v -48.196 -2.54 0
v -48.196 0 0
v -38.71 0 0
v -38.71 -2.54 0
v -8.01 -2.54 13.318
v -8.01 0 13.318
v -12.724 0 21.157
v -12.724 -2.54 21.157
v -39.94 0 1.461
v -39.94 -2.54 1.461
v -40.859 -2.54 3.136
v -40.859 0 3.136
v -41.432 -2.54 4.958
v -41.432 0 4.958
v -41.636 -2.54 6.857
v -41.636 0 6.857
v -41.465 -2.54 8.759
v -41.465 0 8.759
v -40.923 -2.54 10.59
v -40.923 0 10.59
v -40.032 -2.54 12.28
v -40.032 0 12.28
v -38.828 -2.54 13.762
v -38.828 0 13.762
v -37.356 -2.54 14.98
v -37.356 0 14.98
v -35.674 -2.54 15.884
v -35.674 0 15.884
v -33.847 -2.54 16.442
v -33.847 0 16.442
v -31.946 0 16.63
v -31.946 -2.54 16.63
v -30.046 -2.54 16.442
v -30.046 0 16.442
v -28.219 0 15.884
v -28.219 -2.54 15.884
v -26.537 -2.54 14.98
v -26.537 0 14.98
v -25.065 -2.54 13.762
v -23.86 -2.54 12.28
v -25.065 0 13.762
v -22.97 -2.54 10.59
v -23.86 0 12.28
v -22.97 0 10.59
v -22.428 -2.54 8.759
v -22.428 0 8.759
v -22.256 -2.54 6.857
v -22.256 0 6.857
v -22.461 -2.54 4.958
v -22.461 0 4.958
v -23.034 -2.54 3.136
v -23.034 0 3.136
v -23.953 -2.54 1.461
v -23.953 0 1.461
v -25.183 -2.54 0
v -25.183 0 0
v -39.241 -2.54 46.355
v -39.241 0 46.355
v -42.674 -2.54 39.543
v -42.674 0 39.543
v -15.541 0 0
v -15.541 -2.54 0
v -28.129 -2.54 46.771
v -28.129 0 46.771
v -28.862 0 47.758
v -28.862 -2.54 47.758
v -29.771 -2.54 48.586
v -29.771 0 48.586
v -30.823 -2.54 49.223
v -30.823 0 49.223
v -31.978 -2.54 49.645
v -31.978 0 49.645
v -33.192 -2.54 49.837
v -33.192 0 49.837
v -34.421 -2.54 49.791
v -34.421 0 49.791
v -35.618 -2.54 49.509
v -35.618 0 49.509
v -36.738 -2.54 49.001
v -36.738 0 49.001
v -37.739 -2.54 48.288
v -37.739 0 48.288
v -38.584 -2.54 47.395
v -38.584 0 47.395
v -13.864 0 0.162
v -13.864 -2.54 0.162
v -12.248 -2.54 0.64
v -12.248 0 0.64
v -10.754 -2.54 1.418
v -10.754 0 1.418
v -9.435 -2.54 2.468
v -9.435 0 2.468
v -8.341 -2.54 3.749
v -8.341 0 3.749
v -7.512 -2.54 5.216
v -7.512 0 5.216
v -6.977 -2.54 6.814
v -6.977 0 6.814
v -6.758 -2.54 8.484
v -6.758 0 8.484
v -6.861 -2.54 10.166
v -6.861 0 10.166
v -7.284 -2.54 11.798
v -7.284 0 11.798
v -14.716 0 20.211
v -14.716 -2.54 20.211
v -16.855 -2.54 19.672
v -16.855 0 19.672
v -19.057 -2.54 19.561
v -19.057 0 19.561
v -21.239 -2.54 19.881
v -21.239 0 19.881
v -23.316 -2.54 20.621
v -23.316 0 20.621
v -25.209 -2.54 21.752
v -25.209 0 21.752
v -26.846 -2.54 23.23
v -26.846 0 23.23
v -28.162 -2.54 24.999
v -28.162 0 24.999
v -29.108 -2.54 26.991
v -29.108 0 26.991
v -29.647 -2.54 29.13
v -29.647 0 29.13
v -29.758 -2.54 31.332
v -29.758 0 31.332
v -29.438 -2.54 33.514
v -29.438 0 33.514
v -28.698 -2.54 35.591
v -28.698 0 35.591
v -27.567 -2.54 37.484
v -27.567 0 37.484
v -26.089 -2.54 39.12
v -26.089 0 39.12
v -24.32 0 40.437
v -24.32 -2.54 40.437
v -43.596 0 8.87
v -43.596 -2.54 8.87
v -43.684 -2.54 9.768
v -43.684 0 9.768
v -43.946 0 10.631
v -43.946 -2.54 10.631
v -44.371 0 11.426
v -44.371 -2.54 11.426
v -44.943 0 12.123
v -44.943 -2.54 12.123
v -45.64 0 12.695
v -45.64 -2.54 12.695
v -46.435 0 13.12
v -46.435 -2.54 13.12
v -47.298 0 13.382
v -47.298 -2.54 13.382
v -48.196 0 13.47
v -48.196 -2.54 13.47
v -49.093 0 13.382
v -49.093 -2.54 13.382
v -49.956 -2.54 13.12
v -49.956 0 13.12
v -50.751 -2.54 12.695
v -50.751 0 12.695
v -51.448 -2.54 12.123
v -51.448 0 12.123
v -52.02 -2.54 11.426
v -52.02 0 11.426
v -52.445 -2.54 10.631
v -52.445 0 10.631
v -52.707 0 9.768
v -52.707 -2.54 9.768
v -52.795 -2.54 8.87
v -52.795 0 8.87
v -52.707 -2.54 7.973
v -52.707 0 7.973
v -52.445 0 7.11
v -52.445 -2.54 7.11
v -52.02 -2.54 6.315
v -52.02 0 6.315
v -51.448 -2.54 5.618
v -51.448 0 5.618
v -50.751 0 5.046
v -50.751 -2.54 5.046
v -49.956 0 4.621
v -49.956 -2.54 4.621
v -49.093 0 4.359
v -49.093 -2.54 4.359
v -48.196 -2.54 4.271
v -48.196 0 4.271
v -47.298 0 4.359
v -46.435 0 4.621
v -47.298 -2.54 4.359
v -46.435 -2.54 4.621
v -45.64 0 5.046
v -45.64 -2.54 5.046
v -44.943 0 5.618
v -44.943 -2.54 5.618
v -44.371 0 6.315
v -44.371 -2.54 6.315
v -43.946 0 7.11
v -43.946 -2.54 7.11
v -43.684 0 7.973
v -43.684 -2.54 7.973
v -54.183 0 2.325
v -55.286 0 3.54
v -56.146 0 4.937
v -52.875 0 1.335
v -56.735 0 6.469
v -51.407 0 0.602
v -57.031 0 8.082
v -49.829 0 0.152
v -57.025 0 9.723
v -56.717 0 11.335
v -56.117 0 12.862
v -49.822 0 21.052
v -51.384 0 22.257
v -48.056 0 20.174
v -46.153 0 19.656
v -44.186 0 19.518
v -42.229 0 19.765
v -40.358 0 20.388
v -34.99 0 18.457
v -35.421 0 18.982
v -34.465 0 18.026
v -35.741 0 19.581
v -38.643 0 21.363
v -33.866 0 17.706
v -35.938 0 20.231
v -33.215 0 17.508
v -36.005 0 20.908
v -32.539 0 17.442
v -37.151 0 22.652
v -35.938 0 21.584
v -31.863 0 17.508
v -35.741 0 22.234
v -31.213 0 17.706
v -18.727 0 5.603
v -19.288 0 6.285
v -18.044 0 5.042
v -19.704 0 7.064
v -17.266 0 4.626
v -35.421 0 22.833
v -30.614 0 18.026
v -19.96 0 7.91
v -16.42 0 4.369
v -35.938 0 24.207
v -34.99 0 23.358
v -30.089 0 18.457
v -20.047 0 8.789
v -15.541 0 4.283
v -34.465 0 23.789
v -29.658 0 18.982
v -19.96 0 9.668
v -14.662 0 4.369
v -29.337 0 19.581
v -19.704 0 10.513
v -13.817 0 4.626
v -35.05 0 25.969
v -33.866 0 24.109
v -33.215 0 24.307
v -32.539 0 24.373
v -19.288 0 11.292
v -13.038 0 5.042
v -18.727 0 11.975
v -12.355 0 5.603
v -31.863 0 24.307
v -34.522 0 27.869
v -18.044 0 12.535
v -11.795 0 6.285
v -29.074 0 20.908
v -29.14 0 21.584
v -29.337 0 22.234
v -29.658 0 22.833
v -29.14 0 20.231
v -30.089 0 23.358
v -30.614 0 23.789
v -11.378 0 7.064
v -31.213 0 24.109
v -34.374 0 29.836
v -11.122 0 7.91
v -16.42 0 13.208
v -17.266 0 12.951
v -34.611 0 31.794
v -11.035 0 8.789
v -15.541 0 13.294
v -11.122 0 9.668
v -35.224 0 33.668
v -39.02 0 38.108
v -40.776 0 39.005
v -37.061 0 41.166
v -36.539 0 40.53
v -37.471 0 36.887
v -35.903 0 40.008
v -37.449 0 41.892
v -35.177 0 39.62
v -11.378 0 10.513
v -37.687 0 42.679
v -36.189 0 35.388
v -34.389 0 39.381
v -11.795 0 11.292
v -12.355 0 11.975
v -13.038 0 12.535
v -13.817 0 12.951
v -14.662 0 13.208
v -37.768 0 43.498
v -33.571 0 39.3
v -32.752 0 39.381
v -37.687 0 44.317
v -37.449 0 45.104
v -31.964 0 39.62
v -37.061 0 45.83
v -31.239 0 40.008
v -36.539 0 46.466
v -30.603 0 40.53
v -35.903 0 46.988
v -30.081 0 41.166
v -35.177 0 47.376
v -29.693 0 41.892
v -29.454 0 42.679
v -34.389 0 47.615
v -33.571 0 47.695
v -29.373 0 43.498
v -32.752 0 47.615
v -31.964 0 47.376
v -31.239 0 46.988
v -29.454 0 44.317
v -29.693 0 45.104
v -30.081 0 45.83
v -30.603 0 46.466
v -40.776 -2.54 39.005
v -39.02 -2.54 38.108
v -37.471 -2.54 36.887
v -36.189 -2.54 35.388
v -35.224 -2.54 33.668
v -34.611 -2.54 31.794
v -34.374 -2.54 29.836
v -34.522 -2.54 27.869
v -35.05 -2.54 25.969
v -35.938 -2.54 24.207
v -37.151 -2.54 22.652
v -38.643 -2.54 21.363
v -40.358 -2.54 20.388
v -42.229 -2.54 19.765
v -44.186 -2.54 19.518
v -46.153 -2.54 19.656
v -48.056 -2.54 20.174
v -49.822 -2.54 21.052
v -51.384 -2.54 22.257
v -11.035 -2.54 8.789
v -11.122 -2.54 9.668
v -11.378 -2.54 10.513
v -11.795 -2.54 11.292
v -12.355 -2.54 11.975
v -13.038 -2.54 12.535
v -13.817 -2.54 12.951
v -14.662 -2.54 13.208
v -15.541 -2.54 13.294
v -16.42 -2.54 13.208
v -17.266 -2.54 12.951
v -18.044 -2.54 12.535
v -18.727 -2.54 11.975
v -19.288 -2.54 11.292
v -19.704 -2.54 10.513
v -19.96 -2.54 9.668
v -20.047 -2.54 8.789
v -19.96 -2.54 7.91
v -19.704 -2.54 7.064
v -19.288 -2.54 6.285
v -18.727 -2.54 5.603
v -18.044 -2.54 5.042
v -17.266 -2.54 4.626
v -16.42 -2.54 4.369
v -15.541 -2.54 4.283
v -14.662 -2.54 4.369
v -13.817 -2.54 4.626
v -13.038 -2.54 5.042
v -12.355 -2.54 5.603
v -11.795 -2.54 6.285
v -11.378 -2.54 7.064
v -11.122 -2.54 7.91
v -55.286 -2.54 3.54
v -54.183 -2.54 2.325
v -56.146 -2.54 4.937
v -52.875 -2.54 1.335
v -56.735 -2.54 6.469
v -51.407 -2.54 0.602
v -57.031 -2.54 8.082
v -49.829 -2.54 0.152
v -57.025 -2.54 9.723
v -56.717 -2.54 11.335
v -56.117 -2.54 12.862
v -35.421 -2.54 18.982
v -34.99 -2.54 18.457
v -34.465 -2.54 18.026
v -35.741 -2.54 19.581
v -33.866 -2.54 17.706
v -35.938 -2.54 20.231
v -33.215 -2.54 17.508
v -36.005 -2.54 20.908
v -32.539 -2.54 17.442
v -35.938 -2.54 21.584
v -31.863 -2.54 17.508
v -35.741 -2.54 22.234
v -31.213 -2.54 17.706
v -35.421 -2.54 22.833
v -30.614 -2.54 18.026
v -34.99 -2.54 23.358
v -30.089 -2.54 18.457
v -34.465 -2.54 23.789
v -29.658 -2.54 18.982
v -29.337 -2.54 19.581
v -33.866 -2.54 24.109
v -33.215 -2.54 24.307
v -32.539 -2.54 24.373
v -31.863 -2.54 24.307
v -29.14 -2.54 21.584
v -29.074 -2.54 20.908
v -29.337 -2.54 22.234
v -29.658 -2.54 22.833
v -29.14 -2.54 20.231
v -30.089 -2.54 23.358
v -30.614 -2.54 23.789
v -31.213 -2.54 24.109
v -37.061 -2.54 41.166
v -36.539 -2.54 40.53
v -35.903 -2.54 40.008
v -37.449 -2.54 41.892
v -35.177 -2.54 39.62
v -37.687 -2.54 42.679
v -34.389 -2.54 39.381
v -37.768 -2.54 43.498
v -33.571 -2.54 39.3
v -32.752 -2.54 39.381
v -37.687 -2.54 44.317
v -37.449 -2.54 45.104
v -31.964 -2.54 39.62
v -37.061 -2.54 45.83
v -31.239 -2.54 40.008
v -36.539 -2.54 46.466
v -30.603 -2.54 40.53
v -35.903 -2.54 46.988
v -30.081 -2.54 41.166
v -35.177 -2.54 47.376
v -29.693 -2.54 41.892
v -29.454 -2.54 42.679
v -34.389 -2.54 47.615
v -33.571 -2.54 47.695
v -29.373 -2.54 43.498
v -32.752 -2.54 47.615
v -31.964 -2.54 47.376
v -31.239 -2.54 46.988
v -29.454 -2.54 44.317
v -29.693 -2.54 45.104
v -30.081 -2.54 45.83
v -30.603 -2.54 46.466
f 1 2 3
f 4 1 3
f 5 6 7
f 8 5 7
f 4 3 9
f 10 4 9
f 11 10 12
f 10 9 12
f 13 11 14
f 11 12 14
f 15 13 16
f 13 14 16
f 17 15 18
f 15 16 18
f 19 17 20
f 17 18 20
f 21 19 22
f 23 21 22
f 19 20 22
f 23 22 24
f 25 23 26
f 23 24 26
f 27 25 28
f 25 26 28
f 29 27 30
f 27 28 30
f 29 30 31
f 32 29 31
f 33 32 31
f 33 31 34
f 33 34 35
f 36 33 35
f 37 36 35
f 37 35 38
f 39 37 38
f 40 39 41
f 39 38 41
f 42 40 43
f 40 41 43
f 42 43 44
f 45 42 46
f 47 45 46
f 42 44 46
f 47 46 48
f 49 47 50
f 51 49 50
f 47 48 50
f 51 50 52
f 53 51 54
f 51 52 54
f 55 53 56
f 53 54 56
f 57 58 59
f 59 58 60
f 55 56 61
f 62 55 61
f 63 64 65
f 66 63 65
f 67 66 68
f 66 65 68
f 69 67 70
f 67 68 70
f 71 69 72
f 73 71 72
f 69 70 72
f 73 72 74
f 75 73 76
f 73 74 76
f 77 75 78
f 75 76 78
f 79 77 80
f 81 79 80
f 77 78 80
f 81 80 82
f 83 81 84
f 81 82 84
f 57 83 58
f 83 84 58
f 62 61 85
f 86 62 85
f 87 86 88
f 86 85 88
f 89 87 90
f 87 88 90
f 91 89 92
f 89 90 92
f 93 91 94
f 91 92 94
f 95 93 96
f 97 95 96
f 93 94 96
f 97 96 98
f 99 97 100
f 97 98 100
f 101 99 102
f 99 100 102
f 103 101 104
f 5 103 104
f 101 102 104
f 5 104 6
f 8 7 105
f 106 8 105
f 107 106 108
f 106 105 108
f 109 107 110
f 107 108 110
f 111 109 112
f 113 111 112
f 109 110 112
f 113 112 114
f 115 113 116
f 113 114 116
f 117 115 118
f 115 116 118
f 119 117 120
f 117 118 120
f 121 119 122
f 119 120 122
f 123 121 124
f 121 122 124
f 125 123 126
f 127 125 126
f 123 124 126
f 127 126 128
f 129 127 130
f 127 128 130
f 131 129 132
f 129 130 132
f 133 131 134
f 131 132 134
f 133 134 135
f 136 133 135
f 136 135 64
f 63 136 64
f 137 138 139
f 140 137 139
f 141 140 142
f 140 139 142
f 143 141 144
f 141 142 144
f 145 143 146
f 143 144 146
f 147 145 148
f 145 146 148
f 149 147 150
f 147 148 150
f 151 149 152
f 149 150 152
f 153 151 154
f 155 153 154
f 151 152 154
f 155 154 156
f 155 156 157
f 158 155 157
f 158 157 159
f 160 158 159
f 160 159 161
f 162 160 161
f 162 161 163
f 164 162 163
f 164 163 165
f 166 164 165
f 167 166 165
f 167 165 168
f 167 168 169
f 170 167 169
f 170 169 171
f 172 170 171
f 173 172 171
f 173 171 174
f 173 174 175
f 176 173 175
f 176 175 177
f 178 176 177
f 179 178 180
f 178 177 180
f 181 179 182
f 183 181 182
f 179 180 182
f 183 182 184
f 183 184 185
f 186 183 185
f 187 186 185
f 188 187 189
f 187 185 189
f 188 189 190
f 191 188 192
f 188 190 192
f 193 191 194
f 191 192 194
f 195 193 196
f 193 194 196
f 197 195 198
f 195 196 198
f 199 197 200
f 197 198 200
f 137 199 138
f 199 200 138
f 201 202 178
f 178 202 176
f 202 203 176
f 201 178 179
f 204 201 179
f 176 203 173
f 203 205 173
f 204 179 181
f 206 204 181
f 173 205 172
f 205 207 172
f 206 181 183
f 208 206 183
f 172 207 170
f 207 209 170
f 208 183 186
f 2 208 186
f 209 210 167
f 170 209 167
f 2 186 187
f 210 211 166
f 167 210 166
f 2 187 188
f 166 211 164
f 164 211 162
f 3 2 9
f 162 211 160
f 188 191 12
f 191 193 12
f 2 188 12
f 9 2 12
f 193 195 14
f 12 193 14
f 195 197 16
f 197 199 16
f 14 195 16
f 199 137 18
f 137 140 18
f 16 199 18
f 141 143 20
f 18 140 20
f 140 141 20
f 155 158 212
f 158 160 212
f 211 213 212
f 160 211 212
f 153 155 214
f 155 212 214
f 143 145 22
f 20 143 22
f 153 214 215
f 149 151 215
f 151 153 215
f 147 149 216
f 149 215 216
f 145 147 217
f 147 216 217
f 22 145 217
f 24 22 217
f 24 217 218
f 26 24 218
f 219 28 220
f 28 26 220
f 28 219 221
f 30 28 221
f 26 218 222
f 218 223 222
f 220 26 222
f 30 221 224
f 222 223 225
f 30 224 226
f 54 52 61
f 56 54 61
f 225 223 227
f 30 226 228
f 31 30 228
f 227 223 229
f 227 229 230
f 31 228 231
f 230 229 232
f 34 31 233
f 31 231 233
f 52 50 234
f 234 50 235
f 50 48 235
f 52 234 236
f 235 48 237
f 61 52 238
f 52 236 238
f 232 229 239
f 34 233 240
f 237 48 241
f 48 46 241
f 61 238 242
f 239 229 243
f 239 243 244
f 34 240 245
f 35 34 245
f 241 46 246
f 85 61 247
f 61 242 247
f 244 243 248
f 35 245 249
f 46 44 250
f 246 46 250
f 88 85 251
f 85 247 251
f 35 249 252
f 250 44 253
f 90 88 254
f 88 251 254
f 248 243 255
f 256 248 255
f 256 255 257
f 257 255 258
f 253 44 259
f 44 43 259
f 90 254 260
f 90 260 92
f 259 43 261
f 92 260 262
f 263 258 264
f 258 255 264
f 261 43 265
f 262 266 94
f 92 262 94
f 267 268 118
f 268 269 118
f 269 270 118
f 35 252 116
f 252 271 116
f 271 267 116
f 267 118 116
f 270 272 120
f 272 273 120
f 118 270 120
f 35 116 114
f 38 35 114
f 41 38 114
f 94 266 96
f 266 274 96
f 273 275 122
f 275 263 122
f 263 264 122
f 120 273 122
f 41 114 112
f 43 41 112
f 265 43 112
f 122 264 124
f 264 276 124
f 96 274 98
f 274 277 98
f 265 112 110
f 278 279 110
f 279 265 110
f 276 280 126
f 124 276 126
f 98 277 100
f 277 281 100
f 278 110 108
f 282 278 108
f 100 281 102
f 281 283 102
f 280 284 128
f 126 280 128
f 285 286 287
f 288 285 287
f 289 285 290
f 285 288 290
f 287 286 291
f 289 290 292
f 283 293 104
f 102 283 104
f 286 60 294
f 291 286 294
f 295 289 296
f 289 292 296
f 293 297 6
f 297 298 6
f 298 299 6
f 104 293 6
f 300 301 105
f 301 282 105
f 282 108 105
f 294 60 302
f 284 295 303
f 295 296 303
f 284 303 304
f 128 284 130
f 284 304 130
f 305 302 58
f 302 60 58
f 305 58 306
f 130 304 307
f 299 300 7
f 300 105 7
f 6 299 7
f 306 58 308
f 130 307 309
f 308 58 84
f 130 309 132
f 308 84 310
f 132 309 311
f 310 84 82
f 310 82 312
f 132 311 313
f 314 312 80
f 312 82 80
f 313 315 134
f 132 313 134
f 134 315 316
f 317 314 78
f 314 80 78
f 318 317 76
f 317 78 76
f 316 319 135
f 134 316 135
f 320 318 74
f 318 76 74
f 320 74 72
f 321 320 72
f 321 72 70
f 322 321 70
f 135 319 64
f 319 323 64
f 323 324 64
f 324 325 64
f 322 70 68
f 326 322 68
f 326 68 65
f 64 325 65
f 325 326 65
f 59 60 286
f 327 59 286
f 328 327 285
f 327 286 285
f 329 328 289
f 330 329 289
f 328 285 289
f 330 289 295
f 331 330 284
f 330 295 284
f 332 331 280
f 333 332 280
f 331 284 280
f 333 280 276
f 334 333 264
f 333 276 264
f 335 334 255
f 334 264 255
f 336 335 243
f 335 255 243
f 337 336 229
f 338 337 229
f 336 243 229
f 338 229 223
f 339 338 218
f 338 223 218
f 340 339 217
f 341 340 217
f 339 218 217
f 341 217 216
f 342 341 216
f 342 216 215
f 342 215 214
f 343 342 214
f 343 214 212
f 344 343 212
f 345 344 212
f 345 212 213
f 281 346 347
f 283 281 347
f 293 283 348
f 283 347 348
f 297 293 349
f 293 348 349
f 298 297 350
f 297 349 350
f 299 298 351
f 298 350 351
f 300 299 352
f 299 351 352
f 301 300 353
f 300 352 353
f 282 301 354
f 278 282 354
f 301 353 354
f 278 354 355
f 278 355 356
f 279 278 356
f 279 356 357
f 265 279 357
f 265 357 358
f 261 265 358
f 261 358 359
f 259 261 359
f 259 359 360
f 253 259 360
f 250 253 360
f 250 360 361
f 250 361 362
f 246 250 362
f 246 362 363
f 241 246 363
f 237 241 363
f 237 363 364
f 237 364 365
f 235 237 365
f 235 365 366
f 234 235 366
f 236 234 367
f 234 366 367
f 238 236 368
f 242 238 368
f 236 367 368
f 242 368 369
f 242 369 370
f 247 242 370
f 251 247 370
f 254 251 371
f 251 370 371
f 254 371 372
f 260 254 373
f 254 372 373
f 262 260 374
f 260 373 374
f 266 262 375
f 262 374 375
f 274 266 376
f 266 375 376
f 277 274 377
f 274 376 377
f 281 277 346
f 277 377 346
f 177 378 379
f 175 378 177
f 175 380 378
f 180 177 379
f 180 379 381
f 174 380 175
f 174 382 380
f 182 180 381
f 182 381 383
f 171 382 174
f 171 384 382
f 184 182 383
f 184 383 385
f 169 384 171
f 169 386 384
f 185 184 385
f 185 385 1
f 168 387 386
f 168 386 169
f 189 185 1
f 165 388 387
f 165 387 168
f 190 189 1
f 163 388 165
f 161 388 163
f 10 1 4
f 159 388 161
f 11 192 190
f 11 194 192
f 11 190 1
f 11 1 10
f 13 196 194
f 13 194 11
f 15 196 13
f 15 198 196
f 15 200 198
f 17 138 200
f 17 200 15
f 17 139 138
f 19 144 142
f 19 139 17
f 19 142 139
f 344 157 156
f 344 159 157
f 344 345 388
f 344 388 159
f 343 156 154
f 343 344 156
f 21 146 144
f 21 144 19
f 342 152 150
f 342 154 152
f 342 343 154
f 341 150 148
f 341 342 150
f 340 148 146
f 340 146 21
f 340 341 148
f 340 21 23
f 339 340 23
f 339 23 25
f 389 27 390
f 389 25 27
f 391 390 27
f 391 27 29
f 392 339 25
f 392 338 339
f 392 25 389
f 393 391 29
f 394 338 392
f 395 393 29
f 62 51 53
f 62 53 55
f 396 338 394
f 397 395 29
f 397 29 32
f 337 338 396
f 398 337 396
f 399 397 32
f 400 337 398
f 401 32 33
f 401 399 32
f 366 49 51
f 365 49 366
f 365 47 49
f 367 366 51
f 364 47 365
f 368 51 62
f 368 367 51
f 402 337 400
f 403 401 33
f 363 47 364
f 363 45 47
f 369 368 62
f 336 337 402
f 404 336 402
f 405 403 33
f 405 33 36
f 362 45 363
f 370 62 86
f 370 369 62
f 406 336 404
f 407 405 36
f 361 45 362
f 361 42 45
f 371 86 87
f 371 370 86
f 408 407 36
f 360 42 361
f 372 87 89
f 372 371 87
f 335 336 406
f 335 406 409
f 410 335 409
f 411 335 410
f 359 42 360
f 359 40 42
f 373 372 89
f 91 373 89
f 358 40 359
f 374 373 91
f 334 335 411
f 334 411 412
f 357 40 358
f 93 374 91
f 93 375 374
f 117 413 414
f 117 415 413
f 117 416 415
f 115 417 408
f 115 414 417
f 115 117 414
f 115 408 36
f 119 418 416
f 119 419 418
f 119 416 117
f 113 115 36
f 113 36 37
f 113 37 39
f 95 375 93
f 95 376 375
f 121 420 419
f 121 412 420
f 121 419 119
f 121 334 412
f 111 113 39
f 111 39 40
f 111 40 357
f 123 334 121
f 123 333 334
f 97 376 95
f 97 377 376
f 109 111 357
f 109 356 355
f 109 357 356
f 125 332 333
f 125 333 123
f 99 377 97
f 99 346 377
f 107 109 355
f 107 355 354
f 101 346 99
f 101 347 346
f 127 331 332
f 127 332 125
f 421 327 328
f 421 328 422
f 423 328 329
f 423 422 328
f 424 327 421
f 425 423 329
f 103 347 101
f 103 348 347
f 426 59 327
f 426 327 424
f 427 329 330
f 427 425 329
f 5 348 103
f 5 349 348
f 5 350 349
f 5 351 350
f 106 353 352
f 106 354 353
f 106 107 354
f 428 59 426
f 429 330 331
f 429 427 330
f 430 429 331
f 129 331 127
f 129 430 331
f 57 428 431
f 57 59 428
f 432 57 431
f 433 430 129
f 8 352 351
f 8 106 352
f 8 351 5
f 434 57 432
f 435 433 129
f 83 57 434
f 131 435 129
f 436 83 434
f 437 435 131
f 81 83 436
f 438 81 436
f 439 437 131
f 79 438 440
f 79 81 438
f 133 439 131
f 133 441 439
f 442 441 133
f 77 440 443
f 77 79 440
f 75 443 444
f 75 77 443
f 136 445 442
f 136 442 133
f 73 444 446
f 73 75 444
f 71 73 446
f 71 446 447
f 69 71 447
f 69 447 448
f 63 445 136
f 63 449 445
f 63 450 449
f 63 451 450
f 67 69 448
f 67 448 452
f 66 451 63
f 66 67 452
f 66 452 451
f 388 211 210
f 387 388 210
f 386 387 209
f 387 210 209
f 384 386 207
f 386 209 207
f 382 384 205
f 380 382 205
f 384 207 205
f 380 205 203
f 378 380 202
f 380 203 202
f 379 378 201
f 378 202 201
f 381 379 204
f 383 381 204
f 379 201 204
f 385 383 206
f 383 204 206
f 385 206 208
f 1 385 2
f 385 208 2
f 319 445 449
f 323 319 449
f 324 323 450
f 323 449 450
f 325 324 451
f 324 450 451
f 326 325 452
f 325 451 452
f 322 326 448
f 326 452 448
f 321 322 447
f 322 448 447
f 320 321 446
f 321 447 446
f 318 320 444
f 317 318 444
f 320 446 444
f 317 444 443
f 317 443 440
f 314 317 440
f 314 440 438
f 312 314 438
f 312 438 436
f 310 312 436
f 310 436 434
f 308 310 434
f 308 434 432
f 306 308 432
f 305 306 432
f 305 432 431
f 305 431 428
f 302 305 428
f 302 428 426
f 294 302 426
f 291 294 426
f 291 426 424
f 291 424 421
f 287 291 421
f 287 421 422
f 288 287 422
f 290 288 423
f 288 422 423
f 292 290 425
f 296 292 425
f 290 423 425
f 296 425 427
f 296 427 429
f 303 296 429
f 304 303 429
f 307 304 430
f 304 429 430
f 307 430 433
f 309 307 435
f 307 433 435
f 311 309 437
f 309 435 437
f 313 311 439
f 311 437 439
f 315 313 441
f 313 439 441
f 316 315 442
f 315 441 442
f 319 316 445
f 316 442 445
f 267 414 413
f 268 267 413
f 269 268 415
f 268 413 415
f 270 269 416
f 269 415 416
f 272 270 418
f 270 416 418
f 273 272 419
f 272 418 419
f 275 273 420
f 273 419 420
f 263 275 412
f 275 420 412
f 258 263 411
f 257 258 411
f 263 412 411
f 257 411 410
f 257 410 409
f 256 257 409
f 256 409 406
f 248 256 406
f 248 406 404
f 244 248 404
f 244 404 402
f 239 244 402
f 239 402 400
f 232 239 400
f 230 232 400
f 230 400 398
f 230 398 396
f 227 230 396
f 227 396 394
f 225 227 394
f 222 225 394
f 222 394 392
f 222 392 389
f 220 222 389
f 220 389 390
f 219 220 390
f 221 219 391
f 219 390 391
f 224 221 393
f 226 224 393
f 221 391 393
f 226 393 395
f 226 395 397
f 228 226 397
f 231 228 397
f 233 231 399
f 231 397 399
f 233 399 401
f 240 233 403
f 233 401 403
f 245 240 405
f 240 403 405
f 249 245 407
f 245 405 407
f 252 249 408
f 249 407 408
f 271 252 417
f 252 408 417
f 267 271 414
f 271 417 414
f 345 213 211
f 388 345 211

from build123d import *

# Parameters (mm, degrees)
F1_DEPTH = 2.54
F2_R     = 3.465716
F3_DEPTH = 25.4
F4_R     = 4.599805
F4_R_2   = 4.505761
F5_DEPTH = 25.4
F6_R     = 4.197487
F7_DEPTH = 25.4


with BuildPart() as f1:
    # F0 (on Front) → F1 (new body)
    with BuildSketch(Plane.XZ):
        with BuildLine():
            ThreePointArc((-15.541226, 0), (-7.891157, 4.462448), (-8.00983, 13.318121))
            Line((-8.00983, 13.318121), (-12.724322, 21.157009))
            ThreePointArc((-12.724322, 21.157009), (-28.161806, 24.999227), (-24.319587, 40.436711))
            Line((-24.319587, 40.436711), (-28.128936, 46.770598))
            ThreePointArc((-28.128936, 46.770598), (-33.807833, 49.843423), (-39.241434, 46.355143))
            Line((-39.241434, 46.355143), (-42.67387, 39.542808))
            ThreePointArc((-42.67387, 39.542808), (-35.450995, 25.066238), (-51.383585, 22.256688))
            Line((-51.383585, 22.256688), (-56.11723, 12.861851))
            ThreePointArc((-56.11723, 12.861851), (-55.748343, 4.218604), (-48.195517, 0))
            Line((-48.195517, 0), (-38.709875, 0))
            ThreePointArc((-38.709875, 0), (-31.946439, 16.630052), (-25.183003, 0))
            Line((-25.183003, 0), (-15.541226, 0))
        make_face()
    extrude(amount=F1_DEPTH)

    # F2 (on face) → F3 (cut)
    with BuildSketch(Plane.XZ.offset(2.54)):
        with Locations((-32.539293, 20.90759)):
            Circle(F2_R)
    extrude(amount=-F3_DEPTH, mode=Mode.SUBTRACT)

    # F4 (on face) → F5 (cut)
    with BuildSketch(Plane.XZ.offset(2.54)):
        with Locations((-48.195517, 8.870448)):
            Circle(F4_R)
        with Locations((-15.541226, 8.788562)):
            Circle(F4_R_2)
    extrude(amount=-F5_DEPTH, mode=Mode.SUBTRACT)

    # F6 (on face) → F7 (cut)
    with BuildSketch(Plane.XZ.offset(2.54)):
        with Locations((-33.570595, 43.497856)):
            Circle(F6_R)
    extrude(amount=-F7_DEPTH, mode=Mode.SUBTRACT)


solid = f1.part
